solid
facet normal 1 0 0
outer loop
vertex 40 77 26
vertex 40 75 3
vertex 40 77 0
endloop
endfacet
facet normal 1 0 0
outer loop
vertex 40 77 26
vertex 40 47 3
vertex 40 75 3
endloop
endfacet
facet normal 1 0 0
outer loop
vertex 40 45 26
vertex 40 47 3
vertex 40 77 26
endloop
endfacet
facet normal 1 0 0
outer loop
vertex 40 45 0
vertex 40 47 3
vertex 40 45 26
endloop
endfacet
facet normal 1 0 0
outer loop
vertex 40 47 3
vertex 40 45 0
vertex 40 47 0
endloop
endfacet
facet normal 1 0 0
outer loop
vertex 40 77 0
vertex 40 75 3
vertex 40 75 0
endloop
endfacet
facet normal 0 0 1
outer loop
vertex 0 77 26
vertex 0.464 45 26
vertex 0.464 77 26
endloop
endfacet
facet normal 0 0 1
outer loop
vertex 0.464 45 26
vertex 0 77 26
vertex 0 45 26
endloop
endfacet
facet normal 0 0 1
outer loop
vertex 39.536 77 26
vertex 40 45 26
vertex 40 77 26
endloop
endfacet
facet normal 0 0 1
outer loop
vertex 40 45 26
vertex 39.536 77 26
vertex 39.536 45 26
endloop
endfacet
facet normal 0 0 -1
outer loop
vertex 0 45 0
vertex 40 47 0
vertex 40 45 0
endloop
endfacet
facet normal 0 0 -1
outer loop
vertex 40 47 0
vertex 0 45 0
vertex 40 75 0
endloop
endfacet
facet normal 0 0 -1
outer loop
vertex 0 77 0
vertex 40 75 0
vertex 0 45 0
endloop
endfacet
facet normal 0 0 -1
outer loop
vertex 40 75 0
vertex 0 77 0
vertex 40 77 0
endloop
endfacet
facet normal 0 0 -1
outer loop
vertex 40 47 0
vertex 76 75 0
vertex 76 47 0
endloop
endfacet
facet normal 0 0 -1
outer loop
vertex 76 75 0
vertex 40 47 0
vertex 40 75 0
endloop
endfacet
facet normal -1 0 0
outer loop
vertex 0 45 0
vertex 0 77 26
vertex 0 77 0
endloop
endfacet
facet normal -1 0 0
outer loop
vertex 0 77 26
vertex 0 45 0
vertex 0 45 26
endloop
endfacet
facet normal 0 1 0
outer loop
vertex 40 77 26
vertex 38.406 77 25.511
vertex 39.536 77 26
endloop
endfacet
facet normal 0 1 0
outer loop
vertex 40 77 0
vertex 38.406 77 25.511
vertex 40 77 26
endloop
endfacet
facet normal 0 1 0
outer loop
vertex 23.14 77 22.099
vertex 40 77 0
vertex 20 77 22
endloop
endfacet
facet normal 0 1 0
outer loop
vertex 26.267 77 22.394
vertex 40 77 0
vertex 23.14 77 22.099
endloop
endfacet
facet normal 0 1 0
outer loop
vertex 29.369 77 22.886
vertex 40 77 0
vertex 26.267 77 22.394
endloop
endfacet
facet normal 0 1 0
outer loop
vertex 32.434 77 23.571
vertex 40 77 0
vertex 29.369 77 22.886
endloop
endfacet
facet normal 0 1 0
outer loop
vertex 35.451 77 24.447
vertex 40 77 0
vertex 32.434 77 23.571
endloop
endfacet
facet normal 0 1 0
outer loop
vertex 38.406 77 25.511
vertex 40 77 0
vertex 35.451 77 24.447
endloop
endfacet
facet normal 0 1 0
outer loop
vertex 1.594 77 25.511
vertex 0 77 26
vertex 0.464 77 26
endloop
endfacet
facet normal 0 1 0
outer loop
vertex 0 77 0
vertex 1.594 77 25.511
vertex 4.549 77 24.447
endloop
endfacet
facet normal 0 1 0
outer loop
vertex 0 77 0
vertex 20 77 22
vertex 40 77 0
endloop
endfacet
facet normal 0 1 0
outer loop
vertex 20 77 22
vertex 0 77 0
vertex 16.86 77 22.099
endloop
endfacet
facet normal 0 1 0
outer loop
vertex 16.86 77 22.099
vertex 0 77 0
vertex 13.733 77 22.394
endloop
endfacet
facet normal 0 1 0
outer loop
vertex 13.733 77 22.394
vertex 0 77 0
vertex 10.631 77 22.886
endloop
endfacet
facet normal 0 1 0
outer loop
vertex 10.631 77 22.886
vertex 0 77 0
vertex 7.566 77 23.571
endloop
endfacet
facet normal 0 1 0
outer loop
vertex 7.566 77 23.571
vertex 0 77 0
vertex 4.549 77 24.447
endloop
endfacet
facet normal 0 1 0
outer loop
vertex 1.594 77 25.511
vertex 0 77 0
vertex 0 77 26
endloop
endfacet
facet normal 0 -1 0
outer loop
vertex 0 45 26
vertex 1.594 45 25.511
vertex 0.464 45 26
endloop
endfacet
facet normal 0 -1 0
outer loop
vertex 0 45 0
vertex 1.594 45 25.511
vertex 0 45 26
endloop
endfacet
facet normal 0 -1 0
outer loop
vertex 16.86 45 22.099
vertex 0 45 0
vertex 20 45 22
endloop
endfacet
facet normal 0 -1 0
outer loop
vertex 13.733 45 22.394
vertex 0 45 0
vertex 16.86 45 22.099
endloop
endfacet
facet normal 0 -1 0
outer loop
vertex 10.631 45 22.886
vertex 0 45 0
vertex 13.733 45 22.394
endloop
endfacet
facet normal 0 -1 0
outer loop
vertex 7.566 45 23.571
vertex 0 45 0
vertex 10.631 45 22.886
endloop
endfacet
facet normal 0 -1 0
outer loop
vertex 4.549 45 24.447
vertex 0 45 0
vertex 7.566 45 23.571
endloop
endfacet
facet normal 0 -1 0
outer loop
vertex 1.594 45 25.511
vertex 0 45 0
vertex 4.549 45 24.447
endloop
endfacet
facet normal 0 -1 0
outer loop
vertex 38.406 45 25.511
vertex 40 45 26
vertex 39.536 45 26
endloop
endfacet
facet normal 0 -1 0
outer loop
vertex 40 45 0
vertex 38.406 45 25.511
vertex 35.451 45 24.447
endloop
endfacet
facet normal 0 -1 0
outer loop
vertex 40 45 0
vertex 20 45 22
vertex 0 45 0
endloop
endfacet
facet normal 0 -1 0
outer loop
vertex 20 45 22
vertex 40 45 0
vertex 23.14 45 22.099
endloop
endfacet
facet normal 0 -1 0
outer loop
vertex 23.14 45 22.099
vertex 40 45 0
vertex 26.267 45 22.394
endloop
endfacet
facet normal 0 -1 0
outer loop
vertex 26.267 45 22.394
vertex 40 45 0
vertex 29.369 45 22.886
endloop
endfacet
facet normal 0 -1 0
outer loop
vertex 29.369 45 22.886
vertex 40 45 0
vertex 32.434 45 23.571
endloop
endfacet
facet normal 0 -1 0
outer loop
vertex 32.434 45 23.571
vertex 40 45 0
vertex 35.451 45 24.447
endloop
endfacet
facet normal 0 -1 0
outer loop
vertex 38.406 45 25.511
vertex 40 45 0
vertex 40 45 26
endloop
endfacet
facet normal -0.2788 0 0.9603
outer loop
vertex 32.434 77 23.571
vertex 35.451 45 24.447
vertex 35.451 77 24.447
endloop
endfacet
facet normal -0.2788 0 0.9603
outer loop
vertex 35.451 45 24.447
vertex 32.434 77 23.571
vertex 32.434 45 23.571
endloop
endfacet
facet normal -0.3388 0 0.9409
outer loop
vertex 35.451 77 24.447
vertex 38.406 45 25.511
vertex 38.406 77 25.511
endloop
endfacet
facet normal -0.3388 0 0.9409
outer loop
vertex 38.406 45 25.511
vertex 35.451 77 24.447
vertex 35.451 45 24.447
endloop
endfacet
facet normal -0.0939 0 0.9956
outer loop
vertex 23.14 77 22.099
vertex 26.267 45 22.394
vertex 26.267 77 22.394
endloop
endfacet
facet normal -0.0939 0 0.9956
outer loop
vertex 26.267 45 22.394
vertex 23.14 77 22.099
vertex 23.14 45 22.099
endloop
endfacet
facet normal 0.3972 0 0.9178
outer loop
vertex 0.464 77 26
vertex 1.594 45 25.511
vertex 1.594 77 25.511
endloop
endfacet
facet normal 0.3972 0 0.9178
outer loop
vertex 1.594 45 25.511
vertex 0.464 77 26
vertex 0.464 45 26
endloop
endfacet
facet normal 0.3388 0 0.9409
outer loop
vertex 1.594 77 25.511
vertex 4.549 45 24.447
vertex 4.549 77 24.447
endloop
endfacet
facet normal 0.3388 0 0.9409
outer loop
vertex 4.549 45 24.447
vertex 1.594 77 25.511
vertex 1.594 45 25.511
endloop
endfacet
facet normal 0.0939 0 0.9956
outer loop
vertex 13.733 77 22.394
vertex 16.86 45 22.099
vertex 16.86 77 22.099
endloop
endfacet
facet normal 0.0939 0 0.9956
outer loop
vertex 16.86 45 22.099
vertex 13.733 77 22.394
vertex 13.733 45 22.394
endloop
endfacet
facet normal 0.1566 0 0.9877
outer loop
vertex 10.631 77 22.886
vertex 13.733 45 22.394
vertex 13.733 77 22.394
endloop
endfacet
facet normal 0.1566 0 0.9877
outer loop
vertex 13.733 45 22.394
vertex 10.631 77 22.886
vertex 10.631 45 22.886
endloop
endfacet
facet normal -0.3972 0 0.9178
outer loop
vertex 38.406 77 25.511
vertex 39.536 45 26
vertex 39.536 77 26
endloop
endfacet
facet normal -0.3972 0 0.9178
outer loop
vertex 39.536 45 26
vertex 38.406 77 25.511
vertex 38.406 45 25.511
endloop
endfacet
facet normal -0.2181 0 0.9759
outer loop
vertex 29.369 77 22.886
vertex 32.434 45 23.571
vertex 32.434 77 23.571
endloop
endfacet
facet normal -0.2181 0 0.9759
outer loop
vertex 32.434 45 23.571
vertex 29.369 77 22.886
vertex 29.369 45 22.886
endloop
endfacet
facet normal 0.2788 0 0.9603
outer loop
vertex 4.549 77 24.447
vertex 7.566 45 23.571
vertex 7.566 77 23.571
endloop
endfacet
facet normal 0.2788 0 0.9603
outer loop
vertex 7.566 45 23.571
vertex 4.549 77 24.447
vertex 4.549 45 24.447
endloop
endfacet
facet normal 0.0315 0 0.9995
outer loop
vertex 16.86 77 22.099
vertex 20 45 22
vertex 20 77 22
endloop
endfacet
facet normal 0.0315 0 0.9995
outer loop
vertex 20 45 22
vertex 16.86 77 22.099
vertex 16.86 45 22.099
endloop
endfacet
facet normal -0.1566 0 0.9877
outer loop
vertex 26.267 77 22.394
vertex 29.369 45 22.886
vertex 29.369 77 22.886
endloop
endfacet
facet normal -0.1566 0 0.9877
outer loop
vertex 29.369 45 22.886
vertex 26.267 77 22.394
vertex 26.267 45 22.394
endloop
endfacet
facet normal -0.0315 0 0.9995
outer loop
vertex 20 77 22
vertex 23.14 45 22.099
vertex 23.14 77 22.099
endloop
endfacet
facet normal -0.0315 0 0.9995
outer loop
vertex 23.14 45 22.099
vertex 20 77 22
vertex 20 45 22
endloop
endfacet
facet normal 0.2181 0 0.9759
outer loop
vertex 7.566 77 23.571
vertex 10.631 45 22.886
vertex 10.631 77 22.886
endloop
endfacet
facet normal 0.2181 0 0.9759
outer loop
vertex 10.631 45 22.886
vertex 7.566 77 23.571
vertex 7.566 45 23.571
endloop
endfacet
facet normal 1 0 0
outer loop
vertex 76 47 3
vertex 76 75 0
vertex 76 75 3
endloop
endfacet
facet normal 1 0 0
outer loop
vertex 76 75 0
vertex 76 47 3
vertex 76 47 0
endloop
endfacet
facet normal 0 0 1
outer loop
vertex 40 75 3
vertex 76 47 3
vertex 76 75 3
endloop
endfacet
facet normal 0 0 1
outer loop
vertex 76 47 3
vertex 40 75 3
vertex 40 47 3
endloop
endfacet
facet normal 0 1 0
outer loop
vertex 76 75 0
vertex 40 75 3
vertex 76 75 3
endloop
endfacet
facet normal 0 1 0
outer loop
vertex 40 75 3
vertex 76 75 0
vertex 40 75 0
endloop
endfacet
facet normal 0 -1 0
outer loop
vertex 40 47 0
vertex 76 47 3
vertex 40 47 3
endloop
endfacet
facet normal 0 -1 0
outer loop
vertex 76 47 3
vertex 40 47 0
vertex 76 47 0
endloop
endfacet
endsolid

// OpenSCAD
//in milimeters
translate([0,47,0]) cube([76,28,3]);//podlozka
difference(){
    translate([0,45,0])cube([40,32,26]); //hlavni kostka
    translate([20,60,72]) rotate ([90,0,0]) cylinder (h = 40, r=50, center = true, $fn=100); //vyrezavaci cylinder
}
